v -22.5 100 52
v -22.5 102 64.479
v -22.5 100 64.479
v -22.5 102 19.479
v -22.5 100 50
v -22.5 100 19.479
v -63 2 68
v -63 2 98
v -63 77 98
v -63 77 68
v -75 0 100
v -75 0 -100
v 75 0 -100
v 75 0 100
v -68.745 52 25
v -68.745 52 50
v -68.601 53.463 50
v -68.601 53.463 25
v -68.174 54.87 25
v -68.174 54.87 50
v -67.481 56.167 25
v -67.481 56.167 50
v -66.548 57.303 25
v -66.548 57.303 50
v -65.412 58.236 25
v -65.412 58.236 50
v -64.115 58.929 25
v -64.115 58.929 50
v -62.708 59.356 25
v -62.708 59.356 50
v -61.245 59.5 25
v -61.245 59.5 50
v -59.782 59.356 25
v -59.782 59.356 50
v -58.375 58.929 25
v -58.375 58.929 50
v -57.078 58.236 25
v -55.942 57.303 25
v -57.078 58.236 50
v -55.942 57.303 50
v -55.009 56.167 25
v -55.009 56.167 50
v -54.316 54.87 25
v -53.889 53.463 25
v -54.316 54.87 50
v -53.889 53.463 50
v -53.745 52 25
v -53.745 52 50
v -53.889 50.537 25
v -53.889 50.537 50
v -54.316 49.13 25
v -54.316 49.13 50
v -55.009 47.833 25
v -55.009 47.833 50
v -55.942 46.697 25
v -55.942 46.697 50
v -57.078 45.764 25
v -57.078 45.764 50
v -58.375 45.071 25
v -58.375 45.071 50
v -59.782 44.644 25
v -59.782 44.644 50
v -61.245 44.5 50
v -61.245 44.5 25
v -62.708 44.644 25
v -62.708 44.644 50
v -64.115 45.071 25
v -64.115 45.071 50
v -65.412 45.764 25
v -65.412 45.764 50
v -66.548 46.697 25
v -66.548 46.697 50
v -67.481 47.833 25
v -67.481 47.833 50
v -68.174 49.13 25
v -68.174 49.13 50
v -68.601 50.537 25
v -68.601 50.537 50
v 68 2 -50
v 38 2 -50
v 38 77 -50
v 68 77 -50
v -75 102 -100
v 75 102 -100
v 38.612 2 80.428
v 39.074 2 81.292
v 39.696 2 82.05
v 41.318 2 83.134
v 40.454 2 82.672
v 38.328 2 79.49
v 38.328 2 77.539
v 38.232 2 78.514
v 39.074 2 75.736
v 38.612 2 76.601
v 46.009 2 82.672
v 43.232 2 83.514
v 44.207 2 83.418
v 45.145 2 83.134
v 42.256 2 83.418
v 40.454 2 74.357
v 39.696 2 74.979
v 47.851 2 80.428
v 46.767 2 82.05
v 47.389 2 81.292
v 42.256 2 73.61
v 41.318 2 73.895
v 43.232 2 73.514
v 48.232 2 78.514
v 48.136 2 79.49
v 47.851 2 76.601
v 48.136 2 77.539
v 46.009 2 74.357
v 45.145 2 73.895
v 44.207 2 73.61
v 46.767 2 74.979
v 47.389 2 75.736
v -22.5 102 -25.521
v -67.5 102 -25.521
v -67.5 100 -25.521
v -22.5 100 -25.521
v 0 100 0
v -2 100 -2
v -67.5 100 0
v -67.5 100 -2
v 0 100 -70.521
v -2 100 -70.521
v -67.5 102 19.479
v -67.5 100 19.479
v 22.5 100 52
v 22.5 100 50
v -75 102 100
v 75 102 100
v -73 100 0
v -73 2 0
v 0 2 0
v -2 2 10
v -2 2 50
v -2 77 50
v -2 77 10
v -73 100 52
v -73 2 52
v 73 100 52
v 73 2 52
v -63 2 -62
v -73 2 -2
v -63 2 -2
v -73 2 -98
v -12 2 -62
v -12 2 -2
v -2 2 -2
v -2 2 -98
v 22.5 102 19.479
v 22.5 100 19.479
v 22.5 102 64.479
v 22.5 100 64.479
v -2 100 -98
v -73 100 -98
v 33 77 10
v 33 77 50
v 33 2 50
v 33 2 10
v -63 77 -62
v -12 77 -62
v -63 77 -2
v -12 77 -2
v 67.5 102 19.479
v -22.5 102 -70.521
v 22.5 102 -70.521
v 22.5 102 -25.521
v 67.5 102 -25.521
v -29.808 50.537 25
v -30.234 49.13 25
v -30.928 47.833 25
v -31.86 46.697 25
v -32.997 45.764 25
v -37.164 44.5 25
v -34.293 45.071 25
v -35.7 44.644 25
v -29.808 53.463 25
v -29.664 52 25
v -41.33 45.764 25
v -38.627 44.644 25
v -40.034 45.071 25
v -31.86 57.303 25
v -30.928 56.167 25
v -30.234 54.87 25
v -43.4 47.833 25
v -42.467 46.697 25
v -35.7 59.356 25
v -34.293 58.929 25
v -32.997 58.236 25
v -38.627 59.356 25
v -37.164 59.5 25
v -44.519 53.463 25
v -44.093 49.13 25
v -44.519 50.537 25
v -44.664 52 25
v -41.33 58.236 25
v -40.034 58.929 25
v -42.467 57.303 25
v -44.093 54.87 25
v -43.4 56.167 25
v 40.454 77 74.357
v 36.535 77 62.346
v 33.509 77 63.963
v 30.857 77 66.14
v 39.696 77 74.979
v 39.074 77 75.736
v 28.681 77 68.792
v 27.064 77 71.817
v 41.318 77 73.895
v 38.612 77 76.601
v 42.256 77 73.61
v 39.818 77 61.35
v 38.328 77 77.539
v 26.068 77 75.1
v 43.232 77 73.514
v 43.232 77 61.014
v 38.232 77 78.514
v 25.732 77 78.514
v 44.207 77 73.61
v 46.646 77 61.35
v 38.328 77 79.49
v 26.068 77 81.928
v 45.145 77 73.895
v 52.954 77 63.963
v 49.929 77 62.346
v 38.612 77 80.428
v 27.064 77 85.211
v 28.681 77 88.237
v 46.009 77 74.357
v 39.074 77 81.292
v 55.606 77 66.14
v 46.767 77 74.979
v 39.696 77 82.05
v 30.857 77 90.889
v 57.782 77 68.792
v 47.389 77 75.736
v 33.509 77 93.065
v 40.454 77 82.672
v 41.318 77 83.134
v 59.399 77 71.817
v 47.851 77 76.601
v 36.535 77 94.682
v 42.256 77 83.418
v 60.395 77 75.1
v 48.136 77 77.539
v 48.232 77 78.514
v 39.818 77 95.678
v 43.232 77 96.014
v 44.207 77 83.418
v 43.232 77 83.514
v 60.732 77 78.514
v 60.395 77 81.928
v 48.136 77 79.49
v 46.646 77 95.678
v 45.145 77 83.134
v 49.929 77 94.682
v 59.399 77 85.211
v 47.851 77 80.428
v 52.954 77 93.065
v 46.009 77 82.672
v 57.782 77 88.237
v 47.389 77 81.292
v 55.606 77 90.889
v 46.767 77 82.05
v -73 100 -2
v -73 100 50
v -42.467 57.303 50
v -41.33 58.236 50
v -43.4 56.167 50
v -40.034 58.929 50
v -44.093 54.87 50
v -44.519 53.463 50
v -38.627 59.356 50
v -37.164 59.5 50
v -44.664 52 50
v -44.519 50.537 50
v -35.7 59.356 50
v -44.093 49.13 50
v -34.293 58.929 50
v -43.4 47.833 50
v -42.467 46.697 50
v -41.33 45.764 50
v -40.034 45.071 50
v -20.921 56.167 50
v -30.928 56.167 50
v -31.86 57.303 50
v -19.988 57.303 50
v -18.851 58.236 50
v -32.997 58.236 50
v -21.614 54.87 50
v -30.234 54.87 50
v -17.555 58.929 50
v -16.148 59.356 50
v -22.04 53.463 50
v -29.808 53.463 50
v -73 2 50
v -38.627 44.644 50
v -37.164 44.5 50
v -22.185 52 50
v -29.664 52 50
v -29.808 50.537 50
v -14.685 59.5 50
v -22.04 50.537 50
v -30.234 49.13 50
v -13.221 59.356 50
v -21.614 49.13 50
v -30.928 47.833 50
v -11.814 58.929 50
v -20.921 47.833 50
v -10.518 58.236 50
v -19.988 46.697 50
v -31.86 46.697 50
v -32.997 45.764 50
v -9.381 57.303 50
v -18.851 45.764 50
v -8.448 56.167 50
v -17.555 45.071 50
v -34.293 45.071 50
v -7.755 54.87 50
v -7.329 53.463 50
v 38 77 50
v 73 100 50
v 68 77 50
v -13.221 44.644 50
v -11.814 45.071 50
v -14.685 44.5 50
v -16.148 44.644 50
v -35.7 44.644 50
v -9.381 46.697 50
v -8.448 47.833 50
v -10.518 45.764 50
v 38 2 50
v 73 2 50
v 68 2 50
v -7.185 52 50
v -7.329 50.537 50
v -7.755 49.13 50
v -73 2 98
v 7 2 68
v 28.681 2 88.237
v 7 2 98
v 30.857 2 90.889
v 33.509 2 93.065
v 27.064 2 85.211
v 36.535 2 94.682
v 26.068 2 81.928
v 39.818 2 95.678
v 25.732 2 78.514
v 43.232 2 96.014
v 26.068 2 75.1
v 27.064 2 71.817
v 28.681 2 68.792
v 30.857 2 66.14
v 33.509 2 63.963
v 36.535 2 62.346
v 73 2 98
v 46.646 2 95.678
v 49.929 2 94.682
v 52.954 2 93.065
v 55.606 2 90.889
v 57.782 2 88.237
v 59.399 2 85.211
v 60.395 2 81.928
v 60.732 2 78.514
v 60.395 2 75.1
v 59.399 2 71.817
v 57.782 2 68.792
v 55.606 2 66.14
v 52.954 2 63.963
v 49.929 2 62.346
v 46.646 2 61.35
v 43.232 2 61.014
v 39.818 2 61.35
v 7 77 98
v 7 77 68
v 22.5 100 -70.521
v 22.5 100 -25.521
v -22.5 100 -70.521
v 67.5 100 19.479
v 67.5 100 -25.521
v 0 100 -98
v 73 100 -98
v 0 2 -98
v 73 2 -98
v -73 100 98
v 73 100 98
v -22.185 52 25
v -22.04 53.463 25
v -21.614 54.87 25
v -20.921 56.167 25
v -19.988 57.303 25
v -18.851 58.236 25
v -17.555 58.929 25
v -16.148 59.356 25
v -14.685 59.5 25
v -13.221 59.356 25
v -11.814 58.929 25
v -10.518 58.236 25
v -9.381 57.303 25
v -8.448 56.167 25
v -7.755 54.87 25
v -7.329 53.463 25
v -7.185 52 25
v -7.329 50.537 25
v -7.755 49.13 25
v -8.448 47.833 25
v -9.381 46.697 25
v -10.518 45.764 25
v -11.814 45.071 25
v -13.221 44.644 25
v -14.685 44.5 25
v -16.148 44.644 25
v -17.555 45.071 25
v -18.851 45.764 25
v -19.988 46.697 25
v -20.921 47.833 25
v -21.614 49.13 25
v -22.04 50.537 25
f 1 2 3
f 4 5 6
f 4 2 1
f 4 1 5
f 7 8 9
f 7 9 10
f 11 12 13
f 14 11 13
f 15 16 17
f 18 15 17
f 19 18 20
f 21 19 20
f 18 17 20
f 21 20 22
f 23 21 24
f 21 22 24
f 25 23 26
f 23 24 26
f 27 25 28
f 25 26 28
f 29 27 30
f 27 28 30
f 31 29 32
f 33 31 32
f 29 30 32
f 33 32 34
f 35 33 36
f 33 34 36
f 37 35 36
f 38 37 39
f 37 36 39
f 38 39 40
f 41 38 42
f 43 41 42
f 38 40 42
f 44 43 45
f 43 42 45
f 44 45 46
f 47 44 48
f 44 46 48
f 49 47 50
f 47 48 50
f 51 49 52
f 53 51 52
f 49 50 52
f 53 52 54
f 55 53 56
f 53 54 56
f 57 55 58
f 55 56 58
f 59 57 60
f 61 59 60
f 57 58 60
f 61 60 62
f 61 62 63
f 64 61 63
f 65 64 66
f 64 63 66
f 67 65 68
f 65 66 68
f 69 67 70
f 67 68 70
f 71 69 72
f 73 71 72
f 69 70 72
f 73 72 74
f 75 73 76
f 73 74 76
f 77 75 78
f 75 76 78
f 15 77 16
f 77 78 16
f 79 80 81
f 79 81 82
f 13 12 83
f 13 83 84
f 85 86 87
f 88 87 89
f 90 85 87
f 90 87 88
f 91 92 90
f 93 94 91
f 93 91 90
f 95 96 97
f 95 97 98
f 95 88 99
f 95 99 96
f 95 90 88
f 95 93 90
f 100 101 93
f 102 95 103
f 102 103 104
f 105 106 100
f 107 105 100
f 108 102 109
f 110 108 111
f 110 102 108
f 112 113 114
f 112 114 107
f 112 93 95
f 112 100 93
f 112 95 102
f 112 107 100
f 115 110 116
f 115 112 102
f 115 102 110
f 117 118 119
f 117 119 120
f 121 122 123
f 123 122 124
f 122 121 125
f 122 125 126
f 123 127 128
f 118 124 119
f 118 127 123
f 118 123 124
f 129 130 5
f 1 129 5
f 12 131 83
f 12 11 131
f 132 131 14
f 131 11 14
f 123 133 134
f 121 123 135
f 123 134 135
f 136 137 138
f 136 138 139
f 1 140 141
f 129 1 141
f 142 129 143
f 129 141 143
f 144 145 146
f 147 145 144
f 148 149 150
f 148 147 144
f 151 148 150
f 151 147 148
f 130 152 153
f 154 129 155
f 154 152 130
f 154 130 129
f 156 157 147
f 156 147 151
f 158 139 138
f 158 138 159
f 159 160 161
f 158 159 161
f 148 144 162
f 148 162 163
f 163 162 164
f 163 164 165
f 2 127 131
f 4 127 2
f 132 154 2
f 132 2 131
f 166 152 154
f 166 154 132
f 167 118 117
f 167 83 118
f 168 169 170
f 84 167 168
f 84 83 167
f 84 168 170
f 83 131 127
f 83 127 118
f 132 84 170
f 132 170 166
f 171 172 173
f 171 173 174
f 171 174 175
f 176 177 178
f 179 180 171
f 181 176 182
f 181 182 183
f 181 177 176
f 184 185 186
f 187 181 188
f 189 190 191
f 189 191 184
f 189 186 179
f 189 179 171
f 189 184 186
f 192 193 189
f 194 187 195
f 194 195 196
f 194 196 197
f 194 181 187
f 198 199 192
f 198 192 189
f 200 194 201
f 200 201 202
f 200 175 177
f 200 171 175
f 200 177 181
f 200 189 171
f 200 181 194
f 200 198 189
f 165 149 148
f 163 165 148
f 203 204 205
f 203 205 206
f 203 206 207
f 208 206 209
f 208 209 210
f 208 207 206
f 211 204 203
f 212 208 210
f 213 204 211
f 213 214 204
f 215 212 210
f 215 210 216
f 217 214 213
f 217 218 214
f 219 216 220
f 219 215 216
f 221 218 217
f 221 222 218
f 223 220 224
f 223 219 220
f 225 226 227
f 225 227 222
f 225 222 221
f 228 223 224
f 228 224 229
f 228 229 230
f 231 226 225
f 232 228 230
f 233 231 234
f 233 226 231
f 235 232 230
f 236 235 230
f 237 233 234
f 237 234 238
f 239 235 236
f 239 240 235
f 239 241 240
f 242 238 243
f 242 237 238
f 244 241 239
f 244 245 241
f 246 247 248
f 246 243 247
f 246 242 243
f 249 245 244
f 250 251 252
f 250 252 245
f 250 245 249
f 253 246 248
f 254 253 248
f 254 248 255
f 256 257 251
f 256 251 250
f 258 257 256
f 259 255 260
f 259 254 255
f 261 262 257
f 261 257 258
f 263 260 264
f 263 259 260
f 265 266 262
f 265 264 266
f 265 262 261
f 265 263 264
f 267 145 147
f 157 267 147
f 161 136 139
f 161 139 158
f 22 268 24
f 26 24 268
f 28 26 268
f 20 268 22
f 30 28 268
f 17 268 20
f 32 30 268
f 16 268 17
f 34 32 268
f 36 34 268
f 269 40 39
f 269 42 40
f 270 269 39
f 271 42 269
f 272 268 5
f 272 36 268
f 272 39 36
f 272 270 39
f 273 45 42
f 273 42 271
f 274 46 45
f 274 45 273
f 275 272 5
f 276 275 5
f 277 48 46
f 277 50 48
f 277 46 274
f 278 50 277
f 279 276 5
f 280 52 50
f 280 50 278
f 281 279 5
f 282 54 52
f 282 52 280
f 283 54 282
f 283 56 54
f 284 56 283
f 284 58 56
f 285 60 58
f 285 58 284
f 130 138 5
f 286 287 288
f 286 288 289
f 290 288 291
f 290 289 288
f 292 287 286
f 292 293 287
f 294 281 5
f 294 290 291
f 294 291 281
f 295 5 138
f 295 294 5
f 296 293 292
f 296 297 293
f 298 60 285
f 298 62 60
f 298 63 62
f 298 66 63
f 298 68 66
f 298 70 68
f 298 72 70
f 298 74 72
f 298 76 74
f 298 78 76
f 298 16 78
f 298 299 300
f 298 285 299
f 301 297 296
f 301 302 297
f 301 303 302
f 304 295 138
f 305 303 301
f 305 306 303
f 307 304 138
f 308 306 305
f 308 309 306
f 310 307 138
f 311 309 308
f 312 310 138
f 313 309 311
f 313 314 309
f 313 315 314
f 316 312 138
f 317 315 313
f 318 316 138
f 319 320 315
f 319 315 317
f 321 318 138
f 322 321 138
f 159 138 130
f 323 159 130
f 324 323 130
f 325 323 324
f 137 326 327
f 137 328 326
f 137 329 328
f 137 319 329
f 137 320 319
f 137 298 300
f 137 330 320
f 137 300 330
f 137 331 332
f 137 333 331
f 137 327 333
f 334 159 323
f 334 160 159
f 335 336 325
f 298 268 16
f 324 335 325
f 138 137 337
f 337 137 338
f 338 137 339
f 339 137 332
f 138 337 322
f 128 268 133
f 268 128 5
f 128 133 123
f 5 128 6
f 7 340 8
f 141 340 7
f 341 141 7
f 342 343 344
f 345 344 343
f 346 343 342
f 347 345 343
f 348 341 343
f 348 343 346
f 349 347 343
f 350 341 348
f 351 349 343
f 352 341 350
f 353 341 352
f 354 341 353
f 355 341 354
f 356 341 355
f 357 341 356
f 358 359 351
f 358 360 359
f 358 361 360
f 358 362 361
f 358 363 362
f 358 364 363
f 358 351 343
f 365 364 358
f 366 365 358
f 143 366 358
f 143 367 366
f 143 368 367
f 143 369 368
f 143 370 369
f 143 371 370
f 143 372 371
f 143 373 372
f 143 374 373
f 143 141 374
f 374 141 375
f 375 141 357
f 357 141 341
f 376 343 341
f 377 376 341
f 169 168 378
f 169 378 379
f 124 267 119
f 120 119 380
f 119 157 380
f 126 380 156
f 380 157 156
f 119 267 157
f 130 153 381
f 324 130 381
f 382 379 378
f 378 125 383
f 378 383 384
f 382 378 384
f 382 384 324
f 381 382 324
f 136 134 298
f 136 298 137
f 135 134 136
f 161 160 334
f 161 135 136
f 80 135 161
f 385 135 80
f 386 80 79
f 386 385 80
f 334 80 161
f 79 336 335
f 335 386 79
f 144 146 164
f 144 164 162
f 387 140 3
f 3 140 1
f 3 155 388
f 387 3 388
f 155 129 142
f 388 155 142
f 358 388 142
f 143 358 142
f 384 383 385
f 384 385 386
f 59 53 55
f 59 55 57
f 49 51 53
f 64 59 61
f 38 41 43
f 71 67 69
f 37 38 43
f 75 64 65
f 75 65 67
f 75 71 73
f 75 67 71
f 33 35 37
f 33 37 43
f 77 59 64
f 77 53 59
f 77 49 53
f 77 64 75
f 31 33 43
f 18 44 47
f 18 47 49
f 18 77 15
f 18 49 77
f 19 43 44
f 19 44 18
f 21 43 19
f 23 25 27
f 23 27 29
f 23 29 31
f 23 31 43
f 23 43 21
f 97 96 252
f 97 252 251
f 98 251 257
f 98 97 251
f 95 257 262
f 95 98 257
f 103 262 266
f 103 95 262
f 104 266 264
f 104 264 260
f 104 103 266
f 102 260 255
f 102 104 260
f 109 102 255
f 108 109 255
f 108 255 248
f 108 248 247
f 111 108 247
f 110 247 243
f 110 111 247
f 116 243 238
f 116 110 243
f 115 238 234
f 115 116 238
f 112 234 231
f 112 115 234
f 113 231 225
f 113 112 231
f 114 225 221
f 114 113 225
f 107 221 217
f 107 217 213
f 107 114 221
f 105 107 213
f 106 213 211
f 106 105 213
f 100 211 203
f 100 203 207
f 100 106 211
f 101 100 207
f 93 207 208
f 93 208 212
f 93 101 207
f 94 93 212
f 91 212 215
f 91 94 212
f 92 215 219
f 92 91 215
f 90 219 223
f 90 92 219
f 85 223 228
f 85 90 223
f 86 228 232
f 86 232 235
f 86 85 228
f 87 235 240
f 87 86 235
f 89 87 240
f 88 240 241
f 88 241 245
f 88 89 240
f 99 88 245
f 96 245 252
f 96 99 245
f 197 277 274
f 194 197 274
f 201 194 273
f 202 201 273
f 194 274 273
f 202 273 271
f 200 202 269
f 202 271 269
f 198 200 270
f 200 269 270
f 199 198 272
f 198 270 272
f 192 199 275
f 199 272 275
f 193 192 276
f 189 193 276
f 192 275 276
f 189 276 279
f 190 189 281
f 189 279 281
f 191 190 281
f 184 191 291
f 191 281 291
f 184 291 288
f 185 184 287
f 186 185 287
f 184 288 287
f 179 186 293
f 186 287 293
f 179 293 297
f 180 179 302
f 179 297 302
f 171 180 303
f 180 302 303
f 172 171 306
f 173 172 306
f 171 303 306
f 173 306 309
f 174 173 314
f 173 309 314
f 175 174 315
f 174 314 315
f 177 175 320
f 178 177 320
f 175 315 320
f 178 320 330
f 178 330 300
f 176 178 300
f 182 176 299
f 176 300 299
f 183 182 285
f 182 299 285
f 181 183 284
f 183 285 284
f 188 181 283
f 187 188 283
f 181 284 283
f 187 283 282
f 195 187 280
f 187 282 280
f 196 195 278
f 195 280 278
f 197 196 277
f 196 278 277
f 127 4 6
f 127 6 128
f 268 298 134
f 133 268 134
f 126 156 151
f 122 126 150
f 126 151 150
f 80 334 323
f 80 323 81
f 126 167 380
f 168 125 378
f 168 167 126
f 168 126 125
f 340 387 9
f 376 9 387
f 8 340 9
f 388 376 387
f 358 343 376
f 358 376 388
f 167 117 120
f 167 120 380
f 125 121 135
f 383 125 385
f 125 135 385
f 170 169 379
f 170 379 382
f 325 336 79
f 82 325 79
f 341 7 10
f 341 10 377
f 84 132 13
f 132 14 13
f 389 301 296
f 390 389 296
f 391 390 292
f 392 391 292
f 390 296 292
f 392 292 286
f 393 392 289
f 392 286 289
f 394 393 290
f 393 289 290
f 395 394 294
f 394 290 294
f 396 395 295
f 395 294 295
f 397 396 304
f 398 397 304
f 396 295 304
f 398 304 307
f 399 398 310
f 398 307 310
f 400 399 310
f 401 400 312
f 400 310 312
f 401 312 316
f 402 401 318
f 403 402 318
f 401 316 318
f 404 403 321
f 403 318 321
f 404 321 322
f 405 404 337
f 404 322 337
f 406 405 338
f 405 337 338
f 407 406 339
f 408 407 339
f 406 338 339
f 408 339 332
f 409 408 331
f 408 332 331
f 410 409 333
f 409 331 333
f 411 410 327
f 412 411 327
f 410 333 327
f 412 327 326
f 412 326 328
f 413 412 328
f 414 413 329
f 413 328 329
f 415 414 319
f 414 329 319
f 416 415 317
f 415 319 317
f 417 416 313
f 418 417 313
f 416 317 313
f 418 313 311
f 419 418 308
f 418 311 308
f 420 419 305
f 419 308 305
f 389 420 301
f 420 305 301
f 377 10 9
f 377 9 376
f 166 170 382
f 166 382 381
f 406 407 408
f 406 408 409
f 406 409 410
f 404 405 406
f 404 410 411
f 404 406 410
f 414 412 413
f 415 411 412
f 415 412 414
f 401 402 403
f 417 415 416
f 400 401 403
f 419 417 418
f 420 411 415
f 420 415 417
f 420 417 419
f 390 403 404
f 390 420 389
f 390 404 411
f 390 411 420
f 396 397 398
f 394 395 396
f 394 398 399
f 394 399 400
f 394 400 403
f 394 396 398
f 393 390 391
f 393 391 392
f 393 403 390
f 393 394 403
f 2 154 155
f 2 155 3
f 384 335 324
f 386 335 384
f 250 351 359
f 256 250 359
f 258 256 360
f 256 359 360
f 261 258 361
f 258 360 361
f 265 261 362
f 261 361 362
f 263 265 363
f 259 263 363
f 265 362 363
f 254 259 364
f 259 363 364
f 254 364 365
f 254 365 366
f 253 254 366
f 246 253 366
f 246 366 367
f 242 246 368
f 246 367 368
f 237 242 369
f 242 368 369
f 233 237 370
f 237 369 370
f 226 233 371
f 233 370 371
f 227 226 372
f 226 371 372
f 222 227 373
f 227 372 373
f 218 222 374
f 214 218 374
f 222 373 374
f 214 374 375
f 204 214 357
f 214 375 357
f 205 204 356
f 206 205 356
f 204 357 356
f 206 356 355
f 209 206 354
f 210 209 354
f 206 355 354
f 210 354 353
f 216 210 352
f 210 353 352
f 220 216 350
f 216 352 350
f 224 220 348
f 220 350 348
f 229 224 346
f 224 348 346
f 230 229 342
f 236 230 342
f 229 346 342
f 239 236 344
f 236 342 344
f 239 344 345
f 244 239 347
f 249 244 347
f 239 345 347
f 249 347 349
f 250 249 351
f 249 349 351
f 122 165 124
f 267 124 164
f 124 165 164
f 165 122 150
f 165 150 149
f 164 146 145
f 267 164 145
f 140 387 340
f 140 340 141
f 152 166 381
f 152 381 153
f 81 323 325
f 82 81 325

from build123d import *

# Parameters (mm, degrees)
CASING_SKETCH_W     = 150
CASING_SKETCH_H     = 200
CASING_DEPTH        = 100
SHELL1_T            = -2
SKETCH3_W           = 146
SKETCH3_H           = 2
COMPARTMENTS_DEPTH  = 100
SKETCH4_W           = 51
SKETCH4_H           = 60
SKETCH4_W_2         = 30
SKETCH4_H_2         = 100
SKETCH4_W_3         = 35
SKETCH4_H_3         = 40
SKETCH4_W_4         = 70
SKETCH4_H_4         = 30
MEDICINES_DEPTH     = 75
SKETCH6_R           = 17.5
SKETCH6_R_2         = 5
BANDAGE_DEPTH       = 75
SKETCH7_R           = 7.5
VIALS_DEPTH         = 25
SKETCH9_W           = 150
SKETCH9_H           = 200
BOSS_EXTRUDE1_DEPTH = 2
CUT_EXTRUDE1_DEPTH  = 2


with BuildPart() as part:
    # Casing Sketch → Casing (new body)
    with BuildSketch(Plane(origin=(0, 0, 0), x_dir=(1, 0, 0), z_dir=(0, 1, 0))):
        Rectangle(CASING_SKETCH_W, CASING_SKETCH_H)
    extrude(amount=CASING_DEPTH)

    # Shell1
    shell1_openings = [part.faces().sort_by_distance(p)[0] for p in [
        (0, 100, 0),
    ]]
    offset(amount=SHELL1_T, openings=shell1_openings, kind=Kind.INTERSECTION)

    # Sketch3 → Compartments (add)
    with BuildSketch(Plane(origin=(0, 2, 0), x_dir=(1, 0, 0), z_dir=(0, 1, 0))):
        Polygon((-73, 0), (0, 0), (0, 98), (-2, 98), (-2, 2), (-73, 2), align=None)
        with Locations((0, -51)):
            Rectangle(SKETCH3_W, SKETCH3_H)
    extrude(amount=COMPARTMENTS_DEPTH)

    # Sketch4 → Medicines (add)
    with BuildSketch(Plane(origin=(0, 2, 0), x_dir=(1, 0, 0), z_dir=(0, 1, 0))):
        with Locations((-37.5, 32)):
            Rectangle(SKETCH4_W, SKETCH4_H)
        with Locations((53, 0)):
            Rectangle(SKETCH4_W_2, SKETCH4_H_2)
        with Locations((15.5, -30)):
            Rectangle(SKETCH4_W_3, SKETCH4_H_3)
        with Locations((-28, -83)):
            Rectangle(SKETCH4_W_4, SKETCH4_H_4)
    extrude(amount=MEDICINES_DEPTH)

    # Sketch6 → Bandage (add)
    with BuildSketch(Plane(origin=(0, 2, 0), x_dir=(1, 0, 0), z_dir=(0, 1, 0))):
        with Locations((43.231606139, -78.51417502)):
            Circle(SKETCH6_R)
        with Locations((43.231606139, -78.51417502)):
            Circle(SKETCH6_R_2, mode=Mode.SUBTRACT)
    extrude(amount=BANDAGE_DEPTH)

    # Sketch7 → Vials (add)
    with BuildSketch(Plane(origin=(0, 0, 50), x_dir=(-1, 0, 0), z_dir=(0, 0, -1))):
        with Locations((61.244974069, 52)):
            Circle(SKETCH7_R)
        with Locations((37.16355204, 52)):
            Circle(SKETCH7_R)
        with Locations((14.684505224, 52)):
            Circle(SKETCH7_R)
    extrude(amount=VIALS_DEPTH)

    # Sketch9 → Boss-Extrude1 (add)
    with BuildSketch(Plane(origin=(0, 100, 0), x_dir=(1, 0, 0), z_dir=(0, 1, 0))):
        Rectangle(SKETCH9_W, SKETCH9_H)
    extrude(amount=BOSS_EXTRUDE1_DEPTH)

    # Sketch10 → Cut-Extrude1 (cut)
    with BuildSketch(Plane(origin=(0, 102, 0), x_dir=(1, 0, 0), z_dir=(0, 1, 0))):
        Polygon((-22.5, 70.520593301), (22.5, 70.520593301), (22.5, 25.520593301), (67.5, 25.520593301), (67.5, -19.479406699), (22.5, -19.479406699), (22.5, -64.479406699), (-22.5, -64.479406699), (-22.5, -19.479406699), (-67.5, -19.479406699), (-67.5, 25.520593301), (-22.5, 25.520593301), align=None)
    extrude(amount=-CUT_EXTRUDE1_DEPTH, mode=Mode.SUBTRACT)


solid = part.part
